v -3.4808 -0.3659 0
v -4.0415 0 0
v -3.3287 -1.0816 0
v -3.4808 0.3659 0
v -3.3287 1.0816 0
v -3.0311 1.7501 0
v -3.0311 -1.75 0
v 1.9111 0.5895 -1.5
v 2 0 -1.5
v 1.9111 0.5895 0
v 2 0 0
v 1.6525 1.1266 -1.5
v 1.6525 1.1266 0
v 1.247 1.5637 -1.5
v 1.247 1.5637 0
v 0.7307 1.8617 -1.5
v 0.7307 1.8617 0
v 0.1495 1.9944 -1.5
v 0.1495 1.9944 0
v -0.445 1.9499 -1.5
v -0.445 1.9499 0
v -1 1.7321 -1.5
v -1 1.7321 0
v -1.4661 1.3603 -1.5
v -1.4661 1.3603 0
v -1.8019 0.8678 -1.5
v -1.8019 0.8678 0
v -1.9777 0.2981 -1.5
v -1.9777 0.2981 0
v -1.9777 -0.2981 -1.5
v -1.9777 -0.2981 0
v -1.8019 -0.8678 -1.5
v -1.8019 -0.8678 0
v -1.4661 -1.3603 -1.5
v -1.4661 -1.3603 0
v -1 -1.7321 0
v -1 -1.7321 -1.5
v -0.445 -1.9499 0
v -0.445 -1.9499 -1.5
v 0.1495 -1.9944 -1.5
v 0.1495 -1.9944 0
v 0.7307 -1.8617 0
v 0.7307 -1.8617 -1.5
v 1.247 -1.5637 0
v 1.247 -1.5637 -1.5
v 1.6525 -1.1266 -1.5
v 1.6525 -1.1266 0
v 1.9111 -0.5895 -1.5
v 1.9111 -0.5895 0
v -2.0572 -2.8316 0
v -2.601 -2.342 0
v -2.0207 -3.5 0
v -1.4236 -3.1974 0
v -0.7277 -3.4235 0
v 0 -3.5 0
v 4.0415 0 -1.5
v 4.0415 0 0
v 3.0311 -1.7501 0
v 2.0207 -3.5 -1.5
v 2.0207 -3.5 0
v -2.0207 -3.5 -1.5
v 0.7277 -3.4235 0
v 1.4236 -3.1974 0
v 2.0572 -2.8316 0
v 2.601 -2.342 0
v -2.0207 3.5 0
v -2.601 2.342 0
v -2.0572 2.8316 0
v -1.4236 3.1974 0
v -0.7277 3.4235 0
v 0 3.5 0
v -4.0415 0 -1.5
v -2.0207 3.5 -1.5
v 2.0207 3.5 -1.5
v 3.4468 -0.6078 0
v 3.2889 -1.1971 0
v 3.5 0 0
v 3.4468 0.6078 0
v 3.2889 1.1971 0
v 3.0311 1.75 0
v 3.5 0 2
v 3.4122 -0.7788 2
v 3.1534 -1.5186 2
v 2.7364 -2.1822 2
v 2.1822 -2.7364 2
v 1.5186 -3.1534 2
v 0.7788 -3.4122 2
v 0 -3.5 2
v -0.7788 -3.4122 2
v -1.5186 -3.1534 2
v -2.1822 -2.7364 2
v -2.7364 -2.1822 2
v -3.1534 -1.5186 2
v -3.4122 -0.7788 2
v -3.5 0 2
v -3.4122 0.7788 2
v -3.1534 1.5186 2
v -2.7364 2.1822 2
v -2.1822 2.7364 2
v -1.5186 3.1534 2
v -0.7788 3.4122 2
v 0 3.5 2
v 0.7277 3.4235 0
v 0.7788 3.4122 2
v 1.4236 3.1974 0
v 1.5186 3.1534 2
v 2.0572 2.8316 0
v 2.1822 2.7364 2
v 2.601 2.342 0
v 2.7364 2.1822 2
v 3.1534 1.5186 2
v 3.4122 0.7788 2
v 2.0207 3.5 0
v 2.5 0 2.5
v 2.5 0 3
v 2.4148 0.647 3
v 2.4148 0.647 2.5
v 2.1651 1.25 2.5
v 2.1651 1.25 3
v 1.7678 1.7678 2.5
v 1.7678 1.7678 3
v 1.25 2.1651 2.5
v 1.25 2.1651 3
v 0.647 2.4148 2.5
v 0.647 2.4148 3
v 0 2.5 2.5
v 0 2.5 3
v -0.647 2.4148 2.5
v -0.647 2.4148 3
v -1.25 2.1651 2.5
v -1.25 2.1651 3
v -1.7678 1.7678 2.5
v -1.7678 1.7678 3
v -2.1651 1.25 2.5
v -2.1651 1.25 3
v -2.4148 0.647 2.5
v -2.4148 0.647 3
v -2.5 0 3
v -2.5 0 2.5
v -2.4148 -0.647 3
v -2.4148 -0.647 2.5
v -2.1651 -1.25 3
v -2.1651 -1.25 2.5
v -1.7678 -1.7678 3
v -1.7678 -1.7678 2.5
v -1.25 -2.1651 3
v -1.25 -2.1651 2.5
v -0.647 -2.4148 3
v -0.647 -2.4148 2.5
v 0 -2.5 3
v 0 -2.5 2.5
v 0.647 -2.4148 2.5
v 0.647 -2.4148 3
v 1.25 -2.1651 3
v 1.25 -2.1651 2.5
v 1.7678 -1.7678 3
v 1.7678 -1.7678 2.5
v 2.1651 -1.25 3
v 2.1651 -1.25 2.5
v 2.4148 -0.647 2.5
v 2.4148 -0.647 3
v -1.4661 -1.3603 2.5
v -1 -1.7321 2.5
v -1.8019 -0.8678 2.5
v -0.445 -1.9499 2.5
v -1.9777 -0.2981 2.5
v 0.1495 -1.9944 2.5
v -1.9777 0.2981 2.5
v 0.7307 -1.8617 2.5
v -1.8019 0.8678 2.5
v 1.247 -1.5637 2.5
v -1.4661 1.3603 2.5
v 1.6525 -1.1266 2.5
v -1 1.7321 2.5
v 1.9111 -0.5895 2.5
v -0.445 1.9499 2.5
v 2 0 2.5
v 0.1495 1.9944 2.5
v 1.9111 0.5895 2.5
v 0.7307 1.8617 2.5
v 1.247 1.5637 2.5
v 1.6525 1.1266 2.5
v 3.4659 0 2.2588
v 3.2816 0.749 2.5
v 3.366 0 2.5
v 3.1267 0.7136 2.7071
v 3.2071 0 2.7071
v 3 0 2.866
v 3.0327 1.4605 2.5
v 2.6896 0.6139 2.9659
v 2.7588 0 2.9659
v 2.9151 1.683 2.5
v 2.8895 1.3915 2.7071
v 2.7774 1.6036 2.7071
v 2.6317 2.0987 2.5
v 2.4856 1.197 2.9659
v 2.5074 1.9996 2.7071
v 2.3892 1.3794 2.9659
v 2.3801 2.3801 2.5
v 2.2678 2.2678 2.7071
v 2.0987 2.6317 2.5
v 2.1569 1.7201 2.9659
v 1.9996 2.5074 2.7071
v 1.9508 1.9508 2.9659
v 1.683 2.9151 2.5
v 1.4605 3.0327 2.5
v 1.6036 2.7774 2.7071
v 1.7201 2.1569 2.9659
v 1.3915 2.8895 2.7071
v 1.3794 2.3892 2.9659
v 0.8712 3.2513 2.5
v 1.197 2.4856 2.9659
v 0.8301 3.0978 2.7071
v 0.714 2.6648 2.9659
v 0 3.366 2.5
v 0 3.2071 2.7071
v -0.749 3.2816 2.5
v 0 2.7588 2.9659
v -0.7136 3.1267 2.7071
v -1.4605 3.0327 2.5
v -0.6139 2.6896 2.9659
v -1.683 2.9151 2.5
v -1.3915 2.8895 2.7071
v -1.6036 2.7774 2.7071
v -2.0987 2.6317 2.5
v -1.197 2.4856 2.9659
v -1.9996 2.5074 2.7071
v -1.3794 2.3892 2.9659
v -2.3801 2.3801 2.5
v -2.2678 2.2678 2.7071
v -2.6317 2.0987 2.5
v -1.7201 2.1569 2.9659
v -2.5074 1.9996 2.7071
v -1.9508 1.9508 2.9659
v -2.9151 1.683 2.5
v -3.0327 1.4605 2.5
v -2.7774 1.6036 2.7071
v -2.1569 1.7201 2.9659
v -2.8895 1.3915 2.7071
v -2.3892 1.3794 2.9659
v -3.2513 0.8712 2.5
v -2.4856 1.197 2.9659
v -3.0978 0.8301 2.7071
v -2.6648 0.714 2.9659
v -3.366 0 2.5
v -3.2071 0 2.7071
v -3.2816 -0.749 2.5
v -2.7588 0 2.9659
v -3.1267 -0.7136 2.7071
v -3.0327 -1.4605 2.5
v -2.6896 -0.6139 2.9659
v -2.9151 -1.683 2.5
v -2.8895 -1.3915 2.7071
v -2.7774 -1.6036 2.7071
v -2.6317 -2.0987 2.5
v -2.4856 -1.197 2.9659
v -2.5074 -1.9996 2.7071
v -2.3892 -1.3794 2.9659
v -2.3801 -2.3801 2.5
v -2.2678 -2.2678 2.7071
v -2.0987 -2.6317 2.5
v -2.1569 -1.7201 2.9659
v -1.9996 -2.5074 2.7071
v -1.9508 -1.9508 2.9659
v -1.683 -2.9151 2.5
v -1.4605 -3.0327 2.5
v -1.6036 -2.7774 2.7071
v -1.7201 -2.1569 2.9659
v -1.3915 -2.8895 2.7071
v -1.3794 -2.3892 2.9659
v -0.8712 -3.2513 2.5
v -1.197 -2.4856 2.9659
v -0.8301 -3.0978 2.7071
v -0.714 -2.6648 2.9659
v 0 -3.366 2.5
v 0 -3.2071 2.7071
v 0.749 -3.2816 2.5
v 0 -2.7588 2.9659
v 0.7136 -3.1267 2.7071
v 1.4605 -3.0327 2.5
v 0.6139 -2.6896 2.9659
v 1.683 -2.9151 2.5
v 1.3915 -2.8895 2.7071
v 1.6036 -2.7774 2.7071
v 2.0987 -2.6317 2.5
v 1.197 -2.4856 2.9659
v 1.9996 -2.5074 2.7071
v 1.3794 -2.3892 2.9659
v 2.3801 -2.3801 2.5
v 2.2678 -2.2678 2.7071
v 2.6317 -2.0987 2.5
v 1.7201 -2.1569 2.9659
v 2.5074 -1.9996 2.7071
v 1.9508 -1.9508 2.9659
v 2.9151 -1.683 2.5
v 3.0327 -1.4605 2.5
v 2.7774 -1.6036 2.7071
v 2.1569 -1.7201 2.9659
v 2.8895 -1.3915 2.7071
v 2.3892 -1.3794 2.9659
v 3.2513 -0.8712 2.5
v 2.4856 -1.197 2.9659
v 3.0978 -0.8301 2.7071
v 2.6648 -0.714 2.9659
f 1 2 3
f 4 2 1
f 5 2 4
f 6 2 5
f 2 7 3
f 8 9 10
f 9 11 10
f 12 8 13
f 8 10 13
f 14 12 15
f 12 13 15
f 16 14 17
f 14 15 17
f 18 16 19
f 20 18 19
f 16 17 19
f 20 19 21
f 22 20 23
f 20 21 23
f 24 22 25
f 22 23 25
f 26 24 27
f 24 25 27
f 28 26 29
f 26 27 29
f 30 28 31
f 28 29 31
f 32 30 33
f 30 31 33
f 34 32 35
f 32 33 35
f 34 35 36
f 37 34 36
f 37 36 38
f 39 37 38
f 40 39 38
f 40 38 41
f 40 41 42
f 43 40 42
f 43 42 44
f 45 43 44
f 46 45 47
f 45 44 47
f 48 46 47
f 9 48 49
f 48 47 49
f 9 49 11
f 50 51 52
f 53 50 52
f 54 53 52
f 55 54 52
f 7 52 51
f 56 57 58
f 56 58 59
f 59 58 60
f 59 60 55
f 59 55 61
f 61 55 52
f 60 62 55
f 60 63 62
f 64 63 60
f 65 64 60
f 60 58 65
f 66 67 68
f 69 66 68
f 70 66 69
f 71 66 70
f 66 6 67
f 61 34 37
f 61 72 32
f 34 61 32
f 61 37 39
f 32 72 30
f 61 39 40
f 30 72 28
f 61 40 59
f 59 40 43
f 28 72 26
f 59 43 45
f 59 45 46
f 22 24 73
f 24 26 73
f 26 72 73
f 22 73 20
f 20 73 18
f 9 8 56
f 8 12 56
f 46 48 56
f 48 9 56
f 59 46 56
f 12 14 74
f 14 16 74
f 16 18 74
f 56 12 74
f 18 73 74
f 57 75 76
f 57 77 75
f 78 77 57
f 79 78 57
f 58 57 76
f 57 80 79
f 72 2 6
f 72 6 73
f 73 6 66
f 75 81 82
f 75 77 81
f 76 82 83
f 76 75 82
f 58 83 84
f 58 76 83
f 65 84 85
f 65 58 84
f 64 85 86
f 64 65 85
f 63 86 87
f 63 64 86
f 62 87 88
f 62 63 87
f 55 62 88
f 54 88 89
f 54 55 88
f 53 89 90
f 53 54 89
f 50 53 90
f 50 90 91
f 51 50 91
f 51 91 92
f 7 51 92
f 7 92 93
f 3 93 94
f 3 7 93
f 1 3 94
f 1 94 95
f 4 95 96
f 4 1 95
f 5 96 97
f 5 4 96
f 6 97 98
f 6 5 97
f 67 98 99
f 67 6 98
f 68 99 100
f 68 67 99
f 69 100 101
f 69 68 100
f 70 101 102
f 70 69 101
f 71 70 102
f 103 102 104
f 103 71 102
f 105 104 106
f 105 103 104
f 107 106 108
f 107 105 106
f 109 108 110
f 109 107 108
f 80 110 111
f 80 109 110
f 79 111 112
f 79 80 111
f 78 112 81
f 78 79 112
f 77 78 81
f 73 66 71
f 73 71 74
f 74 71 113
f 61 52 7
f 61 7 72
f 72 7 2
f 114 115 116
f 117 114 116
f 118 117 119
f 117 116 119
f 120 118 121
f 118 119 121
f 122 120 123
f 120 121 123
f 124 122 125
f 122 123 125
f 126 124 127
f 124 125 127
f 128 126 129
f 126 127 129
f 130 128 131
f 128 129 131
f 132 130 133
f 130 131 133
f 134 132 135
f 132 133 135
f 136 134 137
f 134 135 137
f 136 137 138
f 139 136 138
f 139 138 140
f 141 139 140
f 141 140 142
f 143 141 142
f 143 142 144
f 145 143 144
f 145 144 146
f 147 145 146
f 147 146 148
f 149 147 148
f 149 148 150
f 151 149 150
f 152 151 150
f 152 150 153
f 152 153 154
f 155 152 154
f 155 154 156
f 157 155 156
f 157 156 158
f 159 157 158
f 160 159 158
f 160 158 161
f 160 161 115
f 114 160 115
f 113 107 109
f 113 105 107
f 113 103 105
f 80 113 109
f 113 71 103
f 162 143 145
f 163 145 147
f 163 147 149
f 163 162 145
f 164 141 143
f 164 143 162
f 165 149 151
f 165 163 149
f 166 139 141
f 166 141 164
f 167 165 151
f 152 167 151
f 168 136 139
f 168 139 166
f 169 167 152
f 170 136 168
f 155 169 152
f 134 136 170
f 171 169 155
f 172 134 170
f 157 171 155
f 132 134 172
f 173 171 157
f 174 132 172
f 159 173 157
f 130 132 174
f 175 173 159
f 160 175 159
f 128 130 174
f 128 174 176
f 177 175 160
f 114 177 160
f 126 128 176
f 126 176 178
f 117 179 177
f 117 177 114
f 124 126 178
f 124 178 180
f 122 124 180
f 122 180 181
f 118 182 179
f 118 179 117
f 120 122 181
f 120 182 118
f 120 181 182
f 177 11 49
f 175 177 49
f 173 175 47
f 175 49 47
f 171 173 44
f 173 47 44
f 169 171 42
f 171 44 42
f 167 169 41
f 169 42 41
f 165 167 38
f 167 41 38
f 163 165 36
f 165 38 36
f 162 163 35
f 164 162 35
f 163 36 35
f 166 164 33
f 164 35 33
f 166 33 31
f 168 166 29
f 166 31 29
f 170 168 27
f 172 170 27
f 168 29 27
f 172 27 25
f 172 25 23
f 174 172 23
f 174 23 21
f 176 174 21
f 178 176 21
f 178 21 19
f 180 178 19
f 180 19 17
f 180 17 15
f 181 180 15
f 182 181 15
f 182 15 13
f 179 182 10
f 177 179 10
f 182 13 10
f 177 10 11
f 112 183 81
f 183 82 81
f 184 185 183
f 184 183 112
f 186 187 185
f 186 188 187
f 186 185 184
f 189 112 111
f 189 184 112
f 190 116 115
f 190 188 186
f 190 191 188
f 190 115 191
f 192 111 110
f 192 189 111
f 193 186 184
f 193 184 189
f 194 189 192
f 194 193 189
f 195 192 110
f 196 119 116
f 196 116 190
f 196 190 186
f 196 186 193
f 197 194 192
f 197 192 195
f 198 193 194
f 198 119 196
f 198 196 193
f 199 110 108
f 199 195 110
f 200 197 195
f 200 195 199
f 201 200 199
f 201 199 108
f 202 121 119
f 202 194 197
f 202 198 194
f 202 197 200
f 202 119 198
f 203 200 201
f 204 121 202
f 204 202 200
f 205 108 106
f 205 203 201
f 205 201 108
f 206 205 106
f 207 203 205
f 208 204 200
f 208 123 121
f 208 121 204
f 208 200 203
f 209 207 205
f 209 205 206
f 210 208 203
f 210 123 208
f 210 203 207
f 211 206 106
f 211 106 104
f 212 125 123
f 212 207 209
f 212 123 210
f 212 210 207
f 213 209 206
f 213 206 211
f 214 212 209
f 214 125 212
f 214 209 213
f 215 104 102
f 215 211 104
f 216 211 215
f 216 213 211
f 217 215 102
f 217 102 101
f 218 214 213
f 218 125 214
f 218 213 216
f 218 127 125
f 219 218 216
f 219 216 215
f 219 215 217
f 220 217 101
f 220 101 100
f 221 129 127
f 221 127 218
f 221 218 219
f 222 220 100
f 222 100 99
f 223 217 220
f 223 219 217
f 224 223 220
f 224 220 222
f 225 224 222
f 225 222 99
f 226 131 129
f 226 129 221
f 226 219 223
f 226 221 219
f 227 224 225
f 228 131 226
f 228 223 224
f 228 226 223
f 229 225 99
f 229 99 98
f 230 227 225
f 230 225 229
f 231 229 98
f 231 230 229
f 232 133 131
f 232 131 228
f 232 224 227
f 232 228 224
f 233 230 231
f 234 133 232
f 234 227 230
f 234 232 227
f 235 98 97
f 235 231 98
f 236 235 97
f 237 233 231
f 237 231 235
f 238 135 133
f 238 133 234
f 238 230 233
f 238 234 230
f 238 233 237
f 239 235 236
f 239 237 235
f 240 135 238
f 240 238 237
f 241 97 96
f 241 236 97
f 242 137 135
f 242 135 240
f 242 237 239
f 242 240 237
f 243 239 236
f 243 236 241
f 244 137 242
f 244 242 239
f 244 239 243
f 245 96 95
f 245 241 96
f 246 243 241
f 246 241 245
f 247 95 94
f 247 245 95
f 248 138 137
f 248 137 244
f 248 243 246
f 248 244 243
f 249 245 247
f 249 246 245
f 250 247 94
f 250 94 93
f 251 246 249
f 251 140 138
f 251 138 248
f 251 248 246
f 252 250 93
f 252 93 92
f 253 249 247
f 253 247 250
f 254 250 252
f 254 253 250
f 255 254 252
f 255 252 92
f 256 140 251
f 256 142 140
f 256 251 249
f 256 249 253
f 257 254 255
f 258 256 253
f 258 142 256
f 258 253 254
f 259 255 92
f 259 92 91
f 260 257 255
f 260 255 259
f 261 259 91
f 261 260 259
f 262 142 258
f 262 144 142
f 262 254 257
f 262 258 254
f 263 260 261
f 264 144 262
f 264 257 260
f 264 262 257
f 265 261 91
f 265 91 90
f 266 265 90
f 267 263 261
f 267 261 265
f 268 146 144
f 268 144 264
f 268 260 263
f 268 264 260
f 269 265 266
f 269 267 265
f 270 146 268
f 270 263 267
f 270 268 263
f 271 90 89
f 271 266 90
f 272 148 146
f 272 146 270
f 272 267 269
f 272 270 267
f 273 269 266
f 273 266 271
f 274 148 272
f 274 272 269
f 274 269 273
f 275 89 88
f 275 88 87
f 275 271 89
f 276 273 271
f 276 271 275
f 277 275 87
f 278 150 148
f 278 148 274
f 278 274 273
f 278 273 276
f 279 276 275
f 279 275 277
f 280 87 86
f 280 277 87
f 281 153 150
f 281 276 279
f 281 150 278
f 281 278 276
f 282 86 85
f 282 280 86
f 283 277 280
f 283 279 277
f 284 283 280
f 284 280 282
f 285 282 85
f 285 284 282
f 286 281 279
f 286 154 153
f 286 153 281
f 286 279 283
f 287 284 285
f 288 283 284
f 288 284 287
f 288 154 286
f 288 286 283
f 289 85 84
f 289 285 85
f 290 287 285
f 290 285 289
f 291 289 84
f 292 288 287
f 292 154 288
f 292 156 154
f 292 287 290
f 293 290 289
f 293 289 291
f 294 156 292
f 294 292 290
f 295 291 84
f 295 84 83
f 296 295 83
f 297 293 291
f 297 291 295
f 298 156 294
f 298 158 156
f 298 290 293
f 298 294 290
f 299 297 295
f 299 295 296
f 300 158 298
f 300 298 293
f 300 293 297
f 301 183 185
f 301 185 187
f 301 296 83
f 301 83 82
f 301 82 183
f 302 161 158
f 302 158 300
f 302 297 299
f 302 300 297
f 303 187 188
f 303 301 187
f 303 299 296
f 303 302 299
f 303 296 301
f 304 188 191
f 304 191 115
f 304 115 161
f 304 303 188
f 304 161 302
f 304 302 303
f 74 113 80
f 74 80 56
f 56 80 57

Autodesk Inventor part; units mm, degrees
ref_plane "YZ Plane" through (0, 0, 0) normal (1, 0, 0) x (0, 1, 0)
ref_plane "XZ Plane" through (0, 0, 0) normal (0, 1, 0) x (-1, 0, 0)
ref_plane "XY Plane" through (0, 0, 0) normal (0, 0, 1) x (1, 0, 0)
sketch "Sketch1" plane through (0, 0, 0) normal (0, 0, 1) x (1, 0, 0)
  circle A0 centre (0, 0) radius 3.5
  dimension "d0" = 7
extrude "Extrusion1" add sketch "Sketch1" along normal blind 3
sketch "Sketch4" plane through (0, 0, 0) normal (0, 0, 1) x (1, 0, 0)
  circle A0 centre (0, 0) radius 3.5 projected
  line L0 (2.0207, 3.5) -> (4.0415, 0)
  line L1 (4.0415, 0) -> (2.0207, -3.5)
  line L2 (2.0207, -3.5) -> (-2.0207, -3.5)
  line L3 (-2.0207, -3.5) -> (-4.0415, 0)
  line L4 (-4.0415, 0) -> (-2.0207, 3.5)
  line L5 (-2.0207, 3.5) -> (2.0207, 3.5)
  point P0 (0, 3.5)
extrude "Extrusion4" add sketch "Sketch4" against normal blind 1.5
fillet "Fillet1" radius 1 1 edges at (-3.5, 0, 3)
sketch "Sketch5" plane through (0, 0, 3) normal (0, 0, 1) x (1, 0, 0)
  circle A0 centre (0, 0) radius 2.5
  dimension "d14" = 5
extrude "Extrusion5" cut sketch "Sketch5" against normal blind 0.5
sketch "Sketch6" plane through (0, 0, 0) normal (0, 0, 1) x (1, 0, 0)
  circle A0 centre (0, 0) radius 2.5 projected
  circle A1 centre (0, 0) radius 2
  dimension "d17" = 4
extrude "Extrusion6" cut sketch "Sketch6" along normal mid plane 16 contours A1
properties part number "bolt"
